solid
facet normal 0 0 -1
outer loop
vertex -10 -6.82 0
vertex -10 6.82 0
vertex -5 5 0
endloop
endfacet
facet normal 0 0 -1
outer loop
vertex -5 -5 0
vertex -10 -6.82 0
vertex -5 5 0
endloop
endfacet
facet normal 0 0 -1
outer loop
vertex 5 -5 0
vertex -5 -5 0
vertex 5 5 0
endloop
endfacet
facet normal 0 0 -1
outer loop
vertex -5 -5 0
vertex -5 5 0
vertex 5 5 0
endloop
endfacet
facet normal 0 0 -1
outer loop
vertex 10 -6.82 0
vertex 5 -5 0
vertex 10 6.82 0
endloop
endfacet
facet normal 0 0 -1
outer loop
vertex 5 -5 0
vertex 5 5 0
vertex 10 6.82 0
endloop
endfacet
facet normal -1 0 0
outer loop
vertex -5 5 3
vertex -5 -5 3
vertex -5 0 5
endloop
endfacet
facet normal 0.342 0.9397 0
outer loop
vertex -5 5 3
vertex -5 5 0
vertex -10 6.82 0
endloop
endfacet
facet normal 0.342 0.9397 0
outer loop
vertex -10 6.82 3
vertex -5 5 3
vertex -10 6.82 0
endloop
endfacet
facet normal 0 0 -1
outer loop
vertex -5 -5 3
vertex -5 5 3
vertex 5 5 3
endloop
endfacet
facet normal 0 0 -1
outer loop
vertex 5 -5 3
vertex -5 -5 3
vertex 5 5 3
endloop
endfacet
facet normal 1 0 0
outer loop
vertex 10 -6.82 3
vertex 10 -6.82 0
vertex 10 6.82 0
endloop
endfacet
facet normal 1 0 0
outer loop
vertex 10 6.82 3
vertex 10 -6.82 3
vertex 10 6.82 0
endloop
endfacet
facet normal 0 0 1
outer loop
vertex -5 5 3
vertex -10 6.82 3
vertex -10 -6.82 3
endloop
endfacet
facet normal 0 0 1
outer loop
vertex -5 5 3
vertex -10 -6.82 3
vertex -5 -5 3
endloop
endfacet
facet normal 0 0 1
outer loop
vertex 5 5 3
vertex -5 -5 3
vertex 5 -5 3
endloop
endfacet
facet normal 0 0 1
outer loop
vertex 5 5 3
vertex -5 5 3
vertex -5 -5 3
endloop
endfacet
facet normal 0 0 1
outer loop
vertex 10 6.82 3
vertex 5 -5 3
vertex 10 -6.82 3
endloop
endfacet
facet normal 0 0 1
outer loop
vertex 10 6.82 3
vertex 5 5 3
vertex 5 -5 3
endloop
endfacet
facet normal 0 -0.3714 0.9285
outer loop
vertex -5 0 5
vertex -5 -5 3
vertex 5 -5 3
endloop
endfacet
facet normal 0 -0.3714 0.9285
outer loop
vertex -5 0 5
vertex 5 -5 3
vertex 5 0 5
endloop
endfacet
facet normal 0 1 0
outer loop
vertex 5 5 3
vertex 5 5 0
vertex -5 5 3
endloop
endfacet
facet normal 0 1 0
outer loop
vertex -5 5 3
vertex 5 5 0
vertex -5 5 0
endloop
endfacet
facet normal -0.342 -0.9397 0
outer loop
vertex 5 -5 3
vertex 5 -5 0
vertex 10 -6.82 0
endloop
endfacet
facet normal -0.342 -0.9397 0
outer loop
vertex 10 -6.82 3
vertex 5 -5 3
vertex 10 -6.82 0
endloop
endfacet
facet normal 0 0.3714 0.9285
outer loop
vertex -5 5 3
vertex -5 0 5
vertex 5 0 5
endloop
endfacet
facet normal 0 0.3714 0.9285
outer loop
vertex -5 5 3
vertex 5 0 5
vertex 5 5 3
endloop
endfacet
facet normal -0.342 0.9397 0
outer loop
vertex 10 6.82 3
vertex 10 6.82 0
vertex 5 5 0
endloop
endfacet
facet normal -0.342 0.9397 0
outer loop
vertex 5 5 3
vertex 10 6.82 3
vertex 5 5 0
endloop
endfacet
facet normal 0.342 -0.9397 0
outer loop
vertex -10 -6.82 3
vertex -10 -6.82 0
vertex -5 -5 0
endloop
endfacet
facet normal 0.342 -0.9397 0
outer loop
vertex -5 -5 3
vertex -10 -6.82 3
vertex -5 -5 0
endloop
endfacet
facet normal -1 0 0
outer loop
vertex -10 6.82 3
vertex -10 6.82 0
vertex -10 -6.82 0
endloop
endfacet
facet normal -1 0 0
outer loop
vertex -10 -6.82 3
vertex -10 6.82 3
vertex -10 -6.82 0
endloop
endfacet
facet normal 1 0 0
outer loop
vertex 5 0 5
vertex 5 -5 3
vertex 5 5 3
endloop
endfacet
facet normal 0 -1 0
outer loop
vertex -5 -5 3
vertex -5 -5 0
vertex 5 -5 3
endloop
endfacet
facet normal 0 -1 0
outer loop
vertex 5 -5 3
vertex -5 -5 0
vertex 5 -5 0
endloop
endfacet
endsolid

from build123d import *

# Parameters (mm, degrees)
F3_W     = 10
F3_H     = 10
F3_W_2   = 5
F4_DEPTH = 3
F5_START = 3
F5_DEPTH = 2
F7_DEPTH = 10


with BuildPart() as f4:
    # F3 (on Top) → F4 (new body)
    with BuildSketch(Plane.XY):
        Polygon((10, 6.8198511713), (5, 5), (5, -5), (10, -6.8198511713), (10, -5), (10, 5), align=None)
        Rectangle(F3_W, F3_H)
        with Locations((-7.5, 0)):
            Rectangle(F3_W_2, F3_H)
        Polygon((-10, -6.8198511713), (-5, -5), (-10, -5), align=None)
        Polygon((-10, 5), (-5, 5), (-10, 6.8198511713), align=None)
    extrude(amount=F4_DEPTH)


with BuildPart() as f5:
    # F3 (on Top) → F5 (new body)
    with BuildSketch(Plane.XY.offset(F5_START)):
        Rectangle(F3_W, F3_H)
    extrude(amount=F5_DEPTH)

    # F6 (on face) → F7 (intersect)
    with BuildSketch(Plane(origin=(-5, 0, 0), x_dir=(0, -1, 0), z_dir=(-1, 0, 0))):
        Polygon((5, 3), (0, 5), (-5, 3), align=None)
    extrude(amount=-F7_DEPTH, mode=Mode.INTERSECT)


solid = Compound([f4.part, f5.part])
